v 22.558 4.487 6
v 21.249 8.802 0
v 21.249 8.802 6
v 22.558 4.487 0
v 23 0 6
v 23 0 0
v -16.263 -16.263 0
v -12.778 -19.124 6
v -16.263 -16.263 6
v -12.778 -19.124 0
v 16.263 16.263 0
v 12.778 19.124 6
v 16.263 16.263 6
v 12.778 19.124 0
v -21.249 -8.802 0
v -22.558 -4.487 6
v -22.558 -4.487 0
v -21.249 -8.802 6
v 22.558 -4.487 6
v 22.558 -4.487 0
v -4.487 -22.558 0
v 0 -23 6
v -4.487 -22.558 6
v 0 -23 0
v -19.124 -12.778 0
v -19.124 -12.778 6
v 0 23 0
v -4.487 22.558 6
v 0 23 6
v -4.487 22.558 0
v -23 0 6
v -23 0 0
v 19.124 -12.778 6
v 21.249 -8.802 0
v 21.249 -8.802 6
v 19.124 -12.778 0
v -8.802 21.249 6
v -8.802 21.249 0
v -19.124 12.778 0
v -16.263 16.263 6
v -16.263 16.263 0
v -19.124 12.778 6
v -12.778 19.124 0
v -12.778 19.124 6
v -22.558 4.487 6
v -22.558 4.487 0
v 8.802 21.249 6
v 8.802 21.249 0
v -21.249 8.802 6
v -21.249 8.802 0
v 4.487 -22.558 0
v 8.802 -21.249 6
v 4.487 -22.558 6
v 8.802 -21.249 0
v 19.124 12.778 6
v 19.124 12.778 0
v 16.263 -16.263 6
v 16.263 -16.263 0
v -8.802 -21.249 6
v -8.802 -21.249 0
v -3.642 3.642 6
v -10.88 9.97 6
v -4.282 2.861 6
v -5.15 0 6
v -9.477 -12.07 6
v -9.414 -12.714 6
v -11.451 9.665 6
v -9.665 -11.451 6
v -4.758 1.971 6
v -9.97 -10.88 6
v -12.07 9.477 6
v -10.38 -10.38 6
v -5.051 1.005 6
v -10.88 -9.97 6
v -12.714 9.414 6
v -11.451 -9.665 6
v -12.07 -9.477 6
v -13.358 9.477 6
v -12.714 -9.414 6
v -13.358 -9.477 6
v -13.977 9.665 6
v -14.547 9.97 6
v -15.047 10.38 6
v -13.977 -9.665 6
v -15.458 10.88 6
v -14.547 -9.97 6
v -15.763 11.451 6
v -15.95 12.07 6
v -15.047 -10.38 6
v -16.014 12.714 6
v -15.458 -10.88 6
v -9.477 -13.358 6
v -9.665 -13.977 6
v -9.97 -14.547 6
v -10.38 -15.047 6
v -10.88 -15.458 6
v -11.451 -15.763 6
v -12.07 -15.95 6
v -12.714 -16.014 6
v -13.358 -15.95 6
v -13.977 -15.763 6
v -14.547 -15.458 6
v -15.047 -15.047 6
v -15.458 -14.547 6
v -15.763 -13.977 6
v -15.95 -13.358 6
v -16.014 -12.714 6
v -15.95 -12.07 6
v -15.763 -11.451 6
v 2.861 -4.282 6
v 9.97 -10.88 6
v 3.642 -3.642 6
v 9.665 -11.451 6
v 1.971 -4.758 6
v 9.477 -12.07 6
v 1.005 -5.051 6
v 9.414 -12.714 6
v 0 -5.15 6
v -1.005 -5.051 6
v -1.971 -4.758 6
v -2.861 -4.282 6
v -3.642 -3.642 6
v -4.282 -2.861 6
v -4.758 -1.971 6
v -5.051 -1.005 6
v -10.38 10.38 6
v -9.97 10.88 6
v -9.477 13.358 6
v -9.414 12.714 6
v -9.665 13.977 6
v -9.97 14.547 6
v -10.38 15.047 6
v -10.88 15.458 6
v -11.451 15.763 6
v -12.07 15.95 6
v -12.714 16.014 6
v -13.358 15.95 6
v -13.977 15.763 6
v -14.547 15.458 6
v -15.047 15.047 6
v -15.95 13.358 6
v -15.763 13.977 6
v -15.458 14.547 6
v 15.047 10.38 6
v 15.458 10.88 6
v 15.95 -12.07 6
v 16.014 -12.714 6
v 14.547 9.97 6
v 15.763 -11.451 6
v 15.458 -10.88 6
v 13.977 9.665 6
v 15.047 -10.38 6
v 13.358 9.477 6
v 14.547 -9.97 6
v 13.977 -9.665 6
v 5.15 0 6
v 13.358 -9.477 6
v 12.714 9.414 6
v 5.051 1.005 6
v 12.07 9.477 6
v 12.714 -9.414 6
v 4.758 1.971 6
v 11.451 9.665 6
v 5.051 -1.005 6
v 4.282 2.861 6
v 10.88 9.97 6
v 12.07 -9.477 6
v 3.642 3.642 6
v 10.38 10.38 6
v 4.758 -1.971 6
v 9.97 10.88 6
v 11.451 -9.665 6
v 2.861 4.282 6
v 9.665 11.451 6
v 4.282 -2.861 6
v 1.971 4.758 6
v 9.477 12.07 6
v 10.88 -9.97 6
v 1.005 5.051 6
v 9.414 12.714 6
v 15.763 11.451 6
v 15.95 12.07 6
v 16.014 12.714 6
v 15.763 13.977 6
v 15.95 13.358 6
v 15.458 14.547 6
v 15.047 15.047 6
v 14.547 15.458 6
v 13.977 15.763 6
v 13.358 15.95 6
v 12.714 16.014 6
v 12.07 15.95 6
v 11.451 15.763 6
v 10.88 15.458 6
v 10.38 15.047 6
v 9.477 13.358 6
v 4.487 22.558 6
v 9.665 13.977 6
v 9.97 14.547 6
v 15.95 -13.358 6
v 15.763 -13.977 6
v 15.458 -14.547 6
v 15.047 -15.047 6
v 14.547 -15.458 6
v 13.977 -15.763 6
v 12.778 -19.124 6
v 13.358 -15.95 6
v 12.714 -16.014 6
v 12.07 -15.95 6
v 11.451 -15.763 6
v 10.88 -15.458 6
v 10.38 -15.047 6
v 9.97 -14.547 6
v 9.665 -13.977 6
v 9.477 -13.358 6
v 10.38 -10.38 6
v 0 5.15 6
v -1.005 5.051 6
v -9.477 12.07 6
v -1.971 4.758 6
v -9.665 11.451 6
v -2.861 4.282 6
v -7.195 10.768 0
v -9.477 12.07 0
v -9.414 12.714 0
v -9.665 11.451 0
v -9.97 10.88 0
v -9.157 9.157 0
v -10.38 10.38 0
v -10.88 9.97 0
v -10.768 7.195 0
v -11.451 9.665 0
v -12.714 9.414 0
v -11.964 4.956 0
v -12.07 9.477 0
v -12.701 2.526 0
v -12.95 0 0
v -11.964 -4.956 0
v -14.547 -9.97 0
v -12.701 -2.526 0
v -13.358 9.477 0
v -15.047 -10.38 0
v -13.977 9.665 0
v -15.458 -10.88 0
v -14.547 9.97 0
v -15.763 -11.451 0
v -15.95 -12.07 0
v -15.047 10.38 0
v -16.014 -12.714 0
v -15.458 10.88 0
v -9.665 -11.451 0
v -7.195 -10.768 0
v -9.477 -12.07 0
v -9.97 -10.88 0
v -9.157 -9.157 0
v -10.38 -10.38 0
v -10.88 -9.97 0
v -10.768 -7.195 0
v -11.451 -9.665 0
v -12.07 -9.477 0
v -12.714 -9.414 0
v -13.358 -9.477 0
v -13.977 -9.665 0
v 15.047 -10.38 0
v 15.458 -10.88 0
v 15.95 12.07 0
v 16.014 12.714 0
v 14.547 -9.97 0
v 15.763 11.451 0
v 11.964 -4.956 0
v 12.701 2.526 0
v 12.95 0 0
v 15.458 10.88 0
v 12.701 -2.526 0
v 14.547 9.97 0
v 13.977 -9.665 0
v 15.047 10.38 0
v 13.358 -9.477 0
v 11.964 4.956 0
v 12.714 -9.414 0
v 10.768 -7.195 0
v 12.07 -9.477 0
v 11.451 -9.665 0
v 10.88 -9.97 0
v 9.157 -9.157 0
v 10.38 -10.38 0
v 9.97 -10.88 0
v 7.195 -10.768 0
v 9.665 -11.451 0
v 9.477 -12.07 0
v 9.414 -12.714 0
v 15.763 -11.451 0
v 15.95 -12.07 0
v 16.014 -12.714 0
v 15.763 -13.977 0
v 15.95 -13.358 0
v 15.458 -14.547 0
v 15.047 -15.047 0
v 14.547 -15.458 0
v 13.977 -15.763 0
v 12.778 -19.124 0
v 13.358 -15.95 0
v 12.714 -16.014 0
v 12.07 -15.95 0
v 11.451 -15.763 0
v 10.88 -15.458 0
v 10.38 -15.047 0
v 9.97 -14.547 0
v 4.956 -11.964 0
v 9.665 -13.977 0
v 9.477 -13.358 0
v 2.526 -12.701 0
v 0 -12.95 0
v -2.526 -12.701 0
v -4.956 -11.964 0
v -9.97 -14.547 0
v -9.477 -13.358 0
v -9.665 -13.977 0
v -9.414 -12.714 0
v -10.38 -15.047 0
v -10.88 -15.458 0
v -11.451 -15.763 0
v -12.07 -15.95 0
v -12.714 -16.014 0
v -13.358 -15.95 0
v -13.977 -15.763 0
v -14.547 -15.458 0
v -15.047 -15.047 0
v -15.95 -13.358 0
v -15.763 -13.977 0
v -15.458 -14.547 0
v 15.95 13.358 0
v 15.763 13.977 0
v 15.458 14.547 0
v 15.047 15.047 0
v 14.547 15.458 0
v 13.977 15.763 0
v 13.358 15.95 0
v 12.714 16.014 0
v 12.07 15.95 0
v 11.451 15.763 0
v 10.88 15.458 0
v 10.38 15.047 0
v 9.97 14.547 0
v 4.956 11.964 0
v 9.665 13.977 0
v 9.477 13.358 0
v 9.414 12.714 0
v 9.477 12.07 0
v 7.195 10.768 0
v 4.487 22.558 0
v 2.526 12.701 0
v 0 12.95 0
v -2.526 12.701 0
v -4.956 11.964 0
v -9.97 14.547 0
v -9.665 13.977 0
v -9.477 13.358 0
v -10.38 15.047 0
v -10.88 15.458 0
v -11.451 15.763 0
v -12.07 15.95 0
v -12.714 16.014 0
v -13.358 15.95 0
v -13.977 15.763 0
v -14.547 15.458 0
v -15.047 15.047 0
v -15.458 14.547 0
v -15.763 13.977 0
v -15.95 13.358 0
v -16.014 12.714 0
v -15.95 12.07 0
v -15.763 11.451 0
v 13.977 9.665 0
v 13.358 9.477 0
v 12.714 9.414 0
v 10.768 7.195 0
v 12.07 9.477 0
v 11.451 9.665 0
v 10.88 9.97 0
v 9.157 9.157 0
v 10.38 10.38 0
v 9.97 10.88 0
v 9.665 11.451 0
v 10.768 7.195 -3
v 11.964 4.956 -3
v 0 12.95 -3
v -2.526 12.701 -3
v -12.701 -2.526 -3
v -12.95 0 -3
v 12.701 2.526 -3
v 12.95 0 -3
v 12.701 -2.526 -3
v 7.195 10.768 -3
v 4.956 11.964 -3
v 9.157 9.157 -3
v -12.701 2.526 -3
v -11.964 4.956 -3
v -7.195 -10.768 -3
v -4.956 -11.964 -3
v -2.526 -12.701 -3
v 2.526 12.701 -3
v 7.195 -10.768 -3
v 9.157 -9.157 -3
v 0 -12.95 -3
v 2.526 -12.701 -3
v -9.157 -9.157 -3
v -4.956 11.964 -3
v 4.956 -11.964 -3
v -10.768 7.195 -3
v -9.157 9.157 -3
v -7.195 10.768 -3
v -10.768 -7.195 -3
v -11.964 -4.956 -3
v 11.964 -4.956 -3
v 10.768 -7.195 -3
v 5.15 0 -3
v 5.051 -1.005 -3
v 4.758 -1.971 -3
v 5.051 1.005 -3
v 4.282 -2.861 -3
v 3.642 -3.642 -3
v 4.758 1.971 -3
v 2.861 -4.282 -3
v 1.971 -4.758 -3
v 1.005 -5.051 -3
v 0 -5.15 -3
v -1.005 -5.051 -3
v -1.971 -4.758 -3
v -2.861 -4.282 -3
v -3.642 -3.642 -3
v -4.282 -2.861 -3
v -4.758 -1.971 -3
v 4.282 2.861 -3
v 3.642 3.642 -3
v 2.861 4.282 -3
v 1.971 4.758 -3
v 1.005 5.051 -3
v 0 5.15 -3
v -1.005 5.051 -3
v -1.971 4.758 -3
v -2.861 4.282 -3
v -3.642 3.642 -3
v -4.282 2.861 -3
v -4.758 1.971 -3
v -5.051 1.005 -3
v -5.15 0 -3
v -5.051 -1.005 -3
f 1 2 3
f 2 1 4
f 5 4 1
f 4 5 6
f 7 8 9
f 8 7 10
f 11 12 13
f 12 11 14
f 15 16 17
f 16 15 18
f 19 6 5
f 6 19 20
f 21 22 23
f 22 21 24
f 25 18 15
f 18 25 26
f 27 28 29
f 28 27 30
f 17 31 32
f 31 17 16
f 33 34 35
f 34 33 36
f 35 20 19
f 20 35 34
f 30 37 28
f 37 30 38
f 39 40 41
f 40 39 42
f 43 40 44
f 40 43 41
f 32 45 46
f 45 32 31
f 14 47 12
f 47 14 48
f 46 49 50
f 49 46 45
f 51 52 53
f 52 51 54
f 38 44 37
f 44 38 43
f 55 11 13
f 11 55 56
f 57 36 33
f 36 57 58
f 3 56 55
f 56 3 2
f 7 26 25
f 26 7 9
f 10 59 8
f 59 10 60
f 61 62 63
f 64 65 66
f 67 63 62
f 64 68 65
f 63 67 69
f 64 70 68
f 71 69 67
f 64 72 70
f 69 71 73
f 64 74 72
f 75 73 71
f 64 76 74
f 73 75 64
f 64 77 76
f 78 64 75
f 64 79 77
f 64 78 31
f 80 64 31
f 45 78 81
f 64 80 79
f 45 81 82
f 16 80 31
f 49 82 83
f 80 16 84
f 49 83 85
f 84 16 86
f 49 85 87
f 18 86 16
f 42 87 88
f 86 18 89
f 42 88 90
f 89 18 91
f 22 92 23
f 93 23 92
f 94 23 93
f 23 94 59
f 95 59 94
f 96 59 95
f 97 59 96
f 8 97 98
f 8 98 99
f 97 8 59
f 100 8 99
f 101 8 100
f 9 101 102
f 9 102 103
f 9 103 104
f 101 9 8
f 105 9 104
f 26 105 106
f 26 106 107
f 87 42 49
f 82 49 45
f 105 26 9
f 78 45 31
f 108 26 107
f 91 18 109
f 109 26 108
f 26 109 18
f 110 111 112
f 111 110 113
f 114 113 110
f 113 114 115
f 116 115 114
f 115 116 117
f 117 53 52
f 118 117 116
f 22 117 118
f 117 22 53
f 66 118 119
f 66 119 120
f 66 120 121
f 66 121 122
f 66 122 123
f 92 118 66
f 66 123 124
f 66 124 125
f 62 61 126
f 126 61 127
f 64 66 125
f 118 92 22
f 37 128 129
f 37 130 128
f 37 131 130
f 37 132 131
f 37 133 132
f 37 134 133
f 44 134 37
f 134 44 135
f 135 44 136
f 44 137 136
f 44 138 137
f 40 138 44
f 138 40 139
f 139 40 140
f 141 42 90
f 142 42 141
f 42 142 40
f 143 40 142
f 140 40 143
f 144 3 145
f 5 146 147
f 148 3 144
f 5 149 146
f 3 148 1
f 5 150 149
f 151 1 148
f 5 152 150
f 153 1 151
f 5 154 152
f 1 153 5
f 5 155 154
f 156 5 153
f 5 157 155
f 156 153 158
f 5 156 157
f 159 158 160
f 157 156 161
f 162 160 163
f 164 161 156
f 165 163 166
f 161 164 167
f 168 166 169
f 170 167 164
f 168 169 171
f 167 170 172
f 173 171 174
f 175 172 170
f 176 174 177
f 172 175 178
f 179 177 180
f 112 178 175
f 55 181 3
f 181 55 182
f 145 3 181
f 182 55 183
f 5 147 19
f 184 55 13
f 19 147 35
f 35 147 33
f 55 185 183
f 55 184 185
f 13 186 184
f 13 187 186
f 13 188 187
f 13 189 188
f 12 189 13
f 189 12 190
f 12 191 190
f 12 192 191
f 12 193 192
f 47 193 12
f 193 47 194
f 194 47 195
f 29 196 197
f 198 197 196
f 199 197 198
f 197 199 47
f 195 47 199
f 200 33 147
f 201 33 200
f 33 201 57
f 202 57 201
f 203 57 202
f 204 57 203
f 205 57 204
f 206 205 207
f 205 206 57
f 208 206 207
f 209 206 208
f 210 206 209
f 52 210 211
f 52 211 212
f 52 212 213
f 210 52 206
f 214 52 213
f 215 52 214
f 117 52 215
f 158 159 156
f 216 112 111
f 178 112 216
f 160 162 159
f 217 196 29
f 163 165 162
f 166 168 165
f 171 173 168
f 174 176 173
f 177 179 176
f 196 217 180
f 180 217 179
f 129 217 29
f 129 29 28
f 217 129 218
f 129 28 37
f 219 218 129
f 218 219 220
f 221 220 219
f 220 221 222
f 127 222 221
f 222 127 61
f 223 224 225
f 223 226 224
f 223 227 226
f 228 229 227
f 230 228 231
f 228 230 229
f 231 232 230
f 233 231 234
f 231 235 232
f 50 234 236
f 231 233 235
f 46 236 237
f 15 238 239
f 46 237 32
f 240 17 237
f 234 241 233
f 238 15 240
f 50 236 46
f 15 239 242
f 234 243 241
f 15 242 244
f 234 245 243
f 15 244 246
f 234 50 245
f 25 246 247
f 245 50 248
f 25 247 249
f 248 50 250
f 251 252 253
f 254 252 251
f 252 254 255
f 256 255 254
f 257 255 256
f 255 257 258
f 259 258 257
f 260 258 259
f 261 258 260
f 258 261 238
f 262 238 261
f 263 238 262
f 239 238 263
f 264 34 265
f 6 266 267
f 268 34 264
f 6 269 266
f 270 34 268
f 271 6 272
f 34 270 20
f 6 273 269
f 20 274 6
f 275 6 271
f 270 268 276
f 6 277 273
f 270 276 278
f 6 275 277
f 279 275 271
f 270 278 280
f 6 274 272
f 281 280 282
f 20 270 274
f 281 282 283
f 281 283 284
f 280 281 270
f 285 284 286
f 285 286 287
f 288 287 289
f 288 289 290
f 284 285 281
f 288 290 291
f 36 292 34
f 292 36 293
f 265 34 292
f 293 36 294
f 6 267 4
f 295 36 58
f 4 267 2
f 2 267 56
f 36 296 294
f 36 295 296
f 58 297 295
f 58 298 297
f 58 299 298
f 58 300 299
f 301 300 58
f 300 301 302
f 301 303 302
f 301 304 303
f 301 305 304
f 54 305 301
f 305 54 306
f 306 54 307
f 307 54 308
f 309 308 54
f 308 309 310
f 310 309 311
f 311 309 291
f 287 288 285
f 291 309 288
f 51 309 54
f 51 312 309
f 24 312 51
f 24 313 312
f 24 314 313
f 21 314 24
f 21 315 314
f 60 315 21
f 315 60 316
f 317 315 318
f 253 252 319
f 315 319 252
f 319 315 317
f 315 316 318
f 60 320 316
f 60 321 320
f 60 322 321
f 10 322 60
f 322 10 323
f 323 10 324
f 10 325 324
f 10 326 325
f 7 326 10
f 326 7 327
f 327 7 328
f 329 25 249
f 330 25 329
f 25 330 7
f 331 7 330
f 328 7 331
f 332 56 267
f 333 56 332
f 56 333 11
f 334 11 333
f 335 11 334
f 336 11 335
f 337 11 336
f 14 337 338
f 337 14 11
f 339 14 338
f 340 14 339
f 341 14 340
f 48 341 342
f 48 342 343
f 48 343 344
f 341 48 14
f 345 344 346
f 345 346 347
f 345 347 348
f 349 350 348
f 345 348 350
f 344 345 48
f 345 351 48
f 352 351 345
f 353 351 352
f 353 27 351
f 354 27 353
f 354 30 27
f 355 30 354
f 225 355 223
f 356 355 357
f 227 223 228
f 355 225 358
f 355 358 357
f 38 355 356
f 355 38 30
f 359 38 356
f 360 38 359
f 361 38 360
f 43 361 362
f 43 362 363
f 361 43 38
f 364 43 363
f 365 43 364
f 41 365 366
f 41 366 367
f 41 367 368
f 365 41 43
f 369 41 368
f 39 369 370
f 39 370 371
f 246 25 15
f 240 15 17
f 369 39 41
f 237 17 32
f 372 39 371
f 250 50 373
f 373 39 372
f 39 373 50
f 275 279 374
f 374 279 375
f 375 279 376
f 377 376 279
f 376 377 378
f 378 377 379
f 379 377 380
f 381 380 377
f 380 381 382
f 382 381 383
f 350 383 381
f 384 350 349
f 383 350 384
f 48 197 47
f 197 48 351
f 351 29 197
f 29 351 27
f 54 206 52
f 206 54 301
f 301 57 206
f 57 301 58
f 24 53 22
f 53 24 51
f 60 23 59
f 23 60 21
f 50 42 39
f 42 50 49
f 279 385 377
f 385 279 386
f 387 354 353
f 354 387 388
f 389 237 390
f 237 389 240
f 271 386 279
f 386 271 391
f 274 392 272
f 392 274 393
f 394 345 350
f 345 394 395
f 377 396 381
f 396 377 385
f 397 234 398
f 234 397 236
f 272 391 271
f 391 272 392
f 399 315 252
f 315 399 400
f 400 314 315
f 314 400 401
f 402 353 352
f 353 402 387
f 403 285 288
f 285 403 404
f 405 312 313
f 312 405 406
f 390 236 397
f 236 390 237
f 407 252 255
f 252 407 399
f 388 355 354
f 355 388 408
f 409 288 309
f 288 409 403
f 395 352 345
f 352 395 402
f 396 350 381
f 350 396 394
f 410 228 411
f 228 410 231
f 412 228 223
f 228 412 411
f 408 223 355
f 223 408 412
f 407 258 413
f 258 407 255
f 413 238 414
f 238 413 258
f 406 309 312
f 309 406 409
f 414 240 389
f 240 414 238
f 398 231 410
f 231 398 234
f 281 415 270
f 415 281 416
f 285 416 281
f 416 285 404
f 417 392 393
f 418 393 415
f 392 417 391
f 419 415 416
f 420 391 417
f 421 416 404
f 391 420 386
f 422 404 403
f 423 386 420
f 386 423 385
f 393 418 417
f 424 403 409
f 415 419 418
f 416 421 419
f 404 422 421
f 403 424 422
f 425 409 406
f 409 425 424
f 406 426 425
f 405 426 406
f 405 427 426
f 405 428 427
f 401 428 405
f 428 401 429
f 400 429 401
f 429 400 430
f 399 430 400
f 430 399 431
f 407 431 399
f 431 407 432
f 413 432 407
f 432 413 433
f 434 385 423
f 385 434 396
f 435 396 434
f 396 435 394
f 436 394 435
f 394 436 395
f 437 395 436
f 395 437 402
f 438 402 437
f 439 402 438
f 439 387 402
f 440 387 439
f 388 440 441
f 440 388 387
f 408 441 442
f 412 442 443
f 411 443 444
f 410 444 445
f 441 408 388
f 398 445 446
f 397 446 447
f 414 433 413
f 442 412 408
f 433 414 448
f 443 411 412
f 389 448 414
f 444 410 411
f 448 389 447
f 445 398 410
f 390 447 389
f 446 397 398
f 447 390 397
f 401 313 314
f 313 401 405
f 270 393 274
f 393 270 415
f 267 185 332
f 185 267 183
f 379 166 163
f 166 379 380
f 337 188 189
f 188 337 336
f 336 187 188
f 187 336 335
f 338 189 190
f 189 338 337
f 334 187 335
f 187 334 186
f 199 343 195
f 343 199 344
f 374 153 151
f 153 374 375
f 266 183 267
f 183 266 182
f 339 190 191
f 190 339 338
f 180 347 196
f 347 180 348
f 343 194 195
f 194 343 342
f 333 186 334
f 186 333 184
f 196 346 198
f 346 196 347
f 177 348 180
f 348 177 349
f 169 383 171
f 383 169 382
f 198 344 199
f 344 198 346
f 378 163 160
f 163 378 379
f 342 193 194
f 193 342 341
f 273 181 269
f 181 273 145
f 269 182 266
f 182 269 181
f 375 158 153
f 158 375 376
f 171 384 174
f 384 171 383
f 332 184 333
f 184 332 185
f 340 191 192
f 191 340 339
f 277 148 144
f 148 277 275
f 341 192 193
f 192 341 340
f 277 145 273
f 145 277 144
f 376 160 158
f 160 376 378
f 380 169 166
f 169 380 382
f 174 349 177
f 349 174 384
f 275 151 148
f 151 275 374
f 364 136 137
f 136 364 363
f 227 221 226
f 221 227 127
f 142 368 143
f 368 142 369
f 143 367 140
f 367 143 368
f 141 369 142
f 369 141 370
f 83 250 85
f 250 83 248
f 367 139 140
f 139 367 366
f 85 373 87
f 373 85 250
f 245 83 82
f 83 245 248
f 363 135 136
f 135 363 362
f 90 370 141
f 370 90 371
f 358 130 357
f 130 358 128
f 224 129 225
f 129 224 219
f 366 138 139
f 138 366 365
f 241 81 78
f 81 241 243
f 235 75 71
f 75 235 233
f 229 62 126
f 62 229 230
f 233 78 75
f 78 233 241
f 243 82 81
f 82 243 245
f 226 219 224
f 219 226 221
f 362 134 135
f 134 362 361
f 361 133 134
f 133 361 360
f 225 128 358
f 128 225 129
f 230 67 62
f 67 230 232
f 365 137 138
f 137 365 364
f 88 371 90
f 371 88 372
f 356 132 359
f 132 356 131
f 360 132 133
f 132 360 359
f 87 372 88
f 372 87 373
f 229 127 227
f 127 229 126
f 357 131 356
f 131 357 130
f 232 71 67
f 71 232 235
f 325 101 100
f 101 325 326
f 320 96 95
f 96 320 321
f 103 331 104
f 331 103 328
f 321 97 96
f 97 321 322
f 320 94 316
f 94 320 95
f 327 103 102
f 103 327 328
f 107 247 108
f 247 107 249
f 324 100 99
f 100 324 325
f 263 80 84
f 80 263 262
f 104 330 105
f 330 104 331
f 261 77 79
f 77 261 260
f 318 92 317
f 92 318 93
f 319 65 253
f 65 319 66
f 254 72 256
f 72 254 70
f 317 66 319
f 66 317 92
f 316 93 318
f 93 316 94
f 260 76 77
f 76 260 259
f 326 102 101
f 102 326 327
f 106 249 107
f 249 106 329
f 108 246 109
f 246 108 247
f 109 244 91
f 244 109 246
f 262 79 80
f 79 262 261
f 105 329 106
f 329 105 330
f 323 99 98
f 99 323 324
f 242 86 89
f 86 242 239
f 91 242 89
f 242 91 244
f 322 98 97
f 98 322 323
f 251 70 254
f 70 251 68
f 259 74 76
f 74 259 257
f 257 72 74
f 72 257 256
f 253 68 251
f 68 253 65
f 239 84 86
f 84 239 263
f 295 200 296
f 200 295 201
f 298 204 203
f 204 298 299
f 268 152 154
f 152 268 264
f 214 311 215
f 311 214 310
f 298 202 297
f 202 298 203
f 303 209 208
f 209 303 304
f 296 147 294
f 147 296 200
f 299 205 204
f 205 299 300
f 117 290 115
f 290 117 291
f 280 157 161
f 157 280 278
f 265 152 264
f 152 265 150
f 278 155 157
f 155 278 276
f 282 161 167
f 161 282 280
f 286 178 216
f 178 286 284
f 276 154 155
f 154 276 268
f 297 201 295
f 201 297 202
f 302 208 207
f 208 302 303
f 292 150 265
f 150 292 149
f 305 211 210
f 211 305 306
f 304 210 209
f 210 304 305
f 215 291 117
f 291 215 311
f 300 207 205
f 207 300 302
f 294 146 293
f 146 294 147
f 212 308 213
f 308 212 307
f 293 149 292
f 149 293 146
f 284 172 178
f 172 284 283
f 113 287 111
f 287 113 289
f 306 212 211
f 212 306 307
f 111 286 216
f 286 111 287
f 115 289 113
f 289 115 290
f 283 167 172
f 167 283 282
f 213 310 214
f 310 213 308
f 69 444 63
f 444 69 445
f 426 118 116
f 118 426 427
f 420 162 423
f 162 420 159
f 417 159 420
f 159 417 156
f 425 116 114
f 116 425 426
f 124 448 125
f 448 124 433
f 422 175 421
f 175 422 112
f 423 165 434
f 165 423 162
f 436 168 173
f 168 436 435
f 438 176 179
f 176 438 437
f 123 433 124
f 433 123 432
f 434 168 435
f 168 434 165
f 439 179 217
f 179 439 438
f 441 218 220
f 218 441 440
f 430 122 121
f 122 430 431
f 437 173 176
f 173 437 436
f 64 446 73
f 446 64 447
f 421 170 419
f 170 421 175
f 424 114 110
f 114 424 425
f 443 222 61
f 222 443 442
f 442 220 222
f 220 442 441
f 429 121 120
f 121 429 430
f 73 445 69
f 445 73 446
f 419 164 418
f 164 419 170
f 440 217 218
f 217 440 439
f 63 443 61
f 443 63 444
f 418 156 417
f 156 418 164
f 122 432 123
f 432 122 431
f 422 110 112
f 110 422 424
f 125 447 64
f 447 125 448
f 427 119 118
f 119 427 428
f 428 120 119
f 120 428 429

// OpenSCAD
$fn = 32;

// ----------------------------------------------------------------------
// Retaining cap: 6000 cover, 46 mm, spigot 25.9 mm
// ----------------------------------------------------------------------

// --- parameters (mm) ---
cap_d = 46;               // cover diameter
cap_t = 6;                // cover thickness
lip_d = 25.9;             // spigot that enters the housing
lip_h = 3;                // spigot height
shaft_d = 10.3;           // shaft opening
bolt_d = 6.6;             // bolt clearance
bolt_r = 17.98;           // bolt circle radius

module cover() {
  cylinder(h = cap_t, d = cap_d);
}

module spigot() {
  /* sunk 1 mm into the cover; the spigot sets the overall height */
  translate([0, 0, -lip_h]) cylinder(h = lip_h + 1, d = lip_d);
}

difference() {
  union() {
    cover();
    spigot();
  }
  for (i = [0 : 3]) rotate([0, 0, 45 + i * 90]) translate([bolt_r, 0, -lip_h - 1])
    cylinder(h = lip_h + cap_t + 2, d = bolt_d);
  translate([0, 0, -lip_h - 1]) cylinder(h = lip_h + cap_t + 2, d = shaft_d);
}
